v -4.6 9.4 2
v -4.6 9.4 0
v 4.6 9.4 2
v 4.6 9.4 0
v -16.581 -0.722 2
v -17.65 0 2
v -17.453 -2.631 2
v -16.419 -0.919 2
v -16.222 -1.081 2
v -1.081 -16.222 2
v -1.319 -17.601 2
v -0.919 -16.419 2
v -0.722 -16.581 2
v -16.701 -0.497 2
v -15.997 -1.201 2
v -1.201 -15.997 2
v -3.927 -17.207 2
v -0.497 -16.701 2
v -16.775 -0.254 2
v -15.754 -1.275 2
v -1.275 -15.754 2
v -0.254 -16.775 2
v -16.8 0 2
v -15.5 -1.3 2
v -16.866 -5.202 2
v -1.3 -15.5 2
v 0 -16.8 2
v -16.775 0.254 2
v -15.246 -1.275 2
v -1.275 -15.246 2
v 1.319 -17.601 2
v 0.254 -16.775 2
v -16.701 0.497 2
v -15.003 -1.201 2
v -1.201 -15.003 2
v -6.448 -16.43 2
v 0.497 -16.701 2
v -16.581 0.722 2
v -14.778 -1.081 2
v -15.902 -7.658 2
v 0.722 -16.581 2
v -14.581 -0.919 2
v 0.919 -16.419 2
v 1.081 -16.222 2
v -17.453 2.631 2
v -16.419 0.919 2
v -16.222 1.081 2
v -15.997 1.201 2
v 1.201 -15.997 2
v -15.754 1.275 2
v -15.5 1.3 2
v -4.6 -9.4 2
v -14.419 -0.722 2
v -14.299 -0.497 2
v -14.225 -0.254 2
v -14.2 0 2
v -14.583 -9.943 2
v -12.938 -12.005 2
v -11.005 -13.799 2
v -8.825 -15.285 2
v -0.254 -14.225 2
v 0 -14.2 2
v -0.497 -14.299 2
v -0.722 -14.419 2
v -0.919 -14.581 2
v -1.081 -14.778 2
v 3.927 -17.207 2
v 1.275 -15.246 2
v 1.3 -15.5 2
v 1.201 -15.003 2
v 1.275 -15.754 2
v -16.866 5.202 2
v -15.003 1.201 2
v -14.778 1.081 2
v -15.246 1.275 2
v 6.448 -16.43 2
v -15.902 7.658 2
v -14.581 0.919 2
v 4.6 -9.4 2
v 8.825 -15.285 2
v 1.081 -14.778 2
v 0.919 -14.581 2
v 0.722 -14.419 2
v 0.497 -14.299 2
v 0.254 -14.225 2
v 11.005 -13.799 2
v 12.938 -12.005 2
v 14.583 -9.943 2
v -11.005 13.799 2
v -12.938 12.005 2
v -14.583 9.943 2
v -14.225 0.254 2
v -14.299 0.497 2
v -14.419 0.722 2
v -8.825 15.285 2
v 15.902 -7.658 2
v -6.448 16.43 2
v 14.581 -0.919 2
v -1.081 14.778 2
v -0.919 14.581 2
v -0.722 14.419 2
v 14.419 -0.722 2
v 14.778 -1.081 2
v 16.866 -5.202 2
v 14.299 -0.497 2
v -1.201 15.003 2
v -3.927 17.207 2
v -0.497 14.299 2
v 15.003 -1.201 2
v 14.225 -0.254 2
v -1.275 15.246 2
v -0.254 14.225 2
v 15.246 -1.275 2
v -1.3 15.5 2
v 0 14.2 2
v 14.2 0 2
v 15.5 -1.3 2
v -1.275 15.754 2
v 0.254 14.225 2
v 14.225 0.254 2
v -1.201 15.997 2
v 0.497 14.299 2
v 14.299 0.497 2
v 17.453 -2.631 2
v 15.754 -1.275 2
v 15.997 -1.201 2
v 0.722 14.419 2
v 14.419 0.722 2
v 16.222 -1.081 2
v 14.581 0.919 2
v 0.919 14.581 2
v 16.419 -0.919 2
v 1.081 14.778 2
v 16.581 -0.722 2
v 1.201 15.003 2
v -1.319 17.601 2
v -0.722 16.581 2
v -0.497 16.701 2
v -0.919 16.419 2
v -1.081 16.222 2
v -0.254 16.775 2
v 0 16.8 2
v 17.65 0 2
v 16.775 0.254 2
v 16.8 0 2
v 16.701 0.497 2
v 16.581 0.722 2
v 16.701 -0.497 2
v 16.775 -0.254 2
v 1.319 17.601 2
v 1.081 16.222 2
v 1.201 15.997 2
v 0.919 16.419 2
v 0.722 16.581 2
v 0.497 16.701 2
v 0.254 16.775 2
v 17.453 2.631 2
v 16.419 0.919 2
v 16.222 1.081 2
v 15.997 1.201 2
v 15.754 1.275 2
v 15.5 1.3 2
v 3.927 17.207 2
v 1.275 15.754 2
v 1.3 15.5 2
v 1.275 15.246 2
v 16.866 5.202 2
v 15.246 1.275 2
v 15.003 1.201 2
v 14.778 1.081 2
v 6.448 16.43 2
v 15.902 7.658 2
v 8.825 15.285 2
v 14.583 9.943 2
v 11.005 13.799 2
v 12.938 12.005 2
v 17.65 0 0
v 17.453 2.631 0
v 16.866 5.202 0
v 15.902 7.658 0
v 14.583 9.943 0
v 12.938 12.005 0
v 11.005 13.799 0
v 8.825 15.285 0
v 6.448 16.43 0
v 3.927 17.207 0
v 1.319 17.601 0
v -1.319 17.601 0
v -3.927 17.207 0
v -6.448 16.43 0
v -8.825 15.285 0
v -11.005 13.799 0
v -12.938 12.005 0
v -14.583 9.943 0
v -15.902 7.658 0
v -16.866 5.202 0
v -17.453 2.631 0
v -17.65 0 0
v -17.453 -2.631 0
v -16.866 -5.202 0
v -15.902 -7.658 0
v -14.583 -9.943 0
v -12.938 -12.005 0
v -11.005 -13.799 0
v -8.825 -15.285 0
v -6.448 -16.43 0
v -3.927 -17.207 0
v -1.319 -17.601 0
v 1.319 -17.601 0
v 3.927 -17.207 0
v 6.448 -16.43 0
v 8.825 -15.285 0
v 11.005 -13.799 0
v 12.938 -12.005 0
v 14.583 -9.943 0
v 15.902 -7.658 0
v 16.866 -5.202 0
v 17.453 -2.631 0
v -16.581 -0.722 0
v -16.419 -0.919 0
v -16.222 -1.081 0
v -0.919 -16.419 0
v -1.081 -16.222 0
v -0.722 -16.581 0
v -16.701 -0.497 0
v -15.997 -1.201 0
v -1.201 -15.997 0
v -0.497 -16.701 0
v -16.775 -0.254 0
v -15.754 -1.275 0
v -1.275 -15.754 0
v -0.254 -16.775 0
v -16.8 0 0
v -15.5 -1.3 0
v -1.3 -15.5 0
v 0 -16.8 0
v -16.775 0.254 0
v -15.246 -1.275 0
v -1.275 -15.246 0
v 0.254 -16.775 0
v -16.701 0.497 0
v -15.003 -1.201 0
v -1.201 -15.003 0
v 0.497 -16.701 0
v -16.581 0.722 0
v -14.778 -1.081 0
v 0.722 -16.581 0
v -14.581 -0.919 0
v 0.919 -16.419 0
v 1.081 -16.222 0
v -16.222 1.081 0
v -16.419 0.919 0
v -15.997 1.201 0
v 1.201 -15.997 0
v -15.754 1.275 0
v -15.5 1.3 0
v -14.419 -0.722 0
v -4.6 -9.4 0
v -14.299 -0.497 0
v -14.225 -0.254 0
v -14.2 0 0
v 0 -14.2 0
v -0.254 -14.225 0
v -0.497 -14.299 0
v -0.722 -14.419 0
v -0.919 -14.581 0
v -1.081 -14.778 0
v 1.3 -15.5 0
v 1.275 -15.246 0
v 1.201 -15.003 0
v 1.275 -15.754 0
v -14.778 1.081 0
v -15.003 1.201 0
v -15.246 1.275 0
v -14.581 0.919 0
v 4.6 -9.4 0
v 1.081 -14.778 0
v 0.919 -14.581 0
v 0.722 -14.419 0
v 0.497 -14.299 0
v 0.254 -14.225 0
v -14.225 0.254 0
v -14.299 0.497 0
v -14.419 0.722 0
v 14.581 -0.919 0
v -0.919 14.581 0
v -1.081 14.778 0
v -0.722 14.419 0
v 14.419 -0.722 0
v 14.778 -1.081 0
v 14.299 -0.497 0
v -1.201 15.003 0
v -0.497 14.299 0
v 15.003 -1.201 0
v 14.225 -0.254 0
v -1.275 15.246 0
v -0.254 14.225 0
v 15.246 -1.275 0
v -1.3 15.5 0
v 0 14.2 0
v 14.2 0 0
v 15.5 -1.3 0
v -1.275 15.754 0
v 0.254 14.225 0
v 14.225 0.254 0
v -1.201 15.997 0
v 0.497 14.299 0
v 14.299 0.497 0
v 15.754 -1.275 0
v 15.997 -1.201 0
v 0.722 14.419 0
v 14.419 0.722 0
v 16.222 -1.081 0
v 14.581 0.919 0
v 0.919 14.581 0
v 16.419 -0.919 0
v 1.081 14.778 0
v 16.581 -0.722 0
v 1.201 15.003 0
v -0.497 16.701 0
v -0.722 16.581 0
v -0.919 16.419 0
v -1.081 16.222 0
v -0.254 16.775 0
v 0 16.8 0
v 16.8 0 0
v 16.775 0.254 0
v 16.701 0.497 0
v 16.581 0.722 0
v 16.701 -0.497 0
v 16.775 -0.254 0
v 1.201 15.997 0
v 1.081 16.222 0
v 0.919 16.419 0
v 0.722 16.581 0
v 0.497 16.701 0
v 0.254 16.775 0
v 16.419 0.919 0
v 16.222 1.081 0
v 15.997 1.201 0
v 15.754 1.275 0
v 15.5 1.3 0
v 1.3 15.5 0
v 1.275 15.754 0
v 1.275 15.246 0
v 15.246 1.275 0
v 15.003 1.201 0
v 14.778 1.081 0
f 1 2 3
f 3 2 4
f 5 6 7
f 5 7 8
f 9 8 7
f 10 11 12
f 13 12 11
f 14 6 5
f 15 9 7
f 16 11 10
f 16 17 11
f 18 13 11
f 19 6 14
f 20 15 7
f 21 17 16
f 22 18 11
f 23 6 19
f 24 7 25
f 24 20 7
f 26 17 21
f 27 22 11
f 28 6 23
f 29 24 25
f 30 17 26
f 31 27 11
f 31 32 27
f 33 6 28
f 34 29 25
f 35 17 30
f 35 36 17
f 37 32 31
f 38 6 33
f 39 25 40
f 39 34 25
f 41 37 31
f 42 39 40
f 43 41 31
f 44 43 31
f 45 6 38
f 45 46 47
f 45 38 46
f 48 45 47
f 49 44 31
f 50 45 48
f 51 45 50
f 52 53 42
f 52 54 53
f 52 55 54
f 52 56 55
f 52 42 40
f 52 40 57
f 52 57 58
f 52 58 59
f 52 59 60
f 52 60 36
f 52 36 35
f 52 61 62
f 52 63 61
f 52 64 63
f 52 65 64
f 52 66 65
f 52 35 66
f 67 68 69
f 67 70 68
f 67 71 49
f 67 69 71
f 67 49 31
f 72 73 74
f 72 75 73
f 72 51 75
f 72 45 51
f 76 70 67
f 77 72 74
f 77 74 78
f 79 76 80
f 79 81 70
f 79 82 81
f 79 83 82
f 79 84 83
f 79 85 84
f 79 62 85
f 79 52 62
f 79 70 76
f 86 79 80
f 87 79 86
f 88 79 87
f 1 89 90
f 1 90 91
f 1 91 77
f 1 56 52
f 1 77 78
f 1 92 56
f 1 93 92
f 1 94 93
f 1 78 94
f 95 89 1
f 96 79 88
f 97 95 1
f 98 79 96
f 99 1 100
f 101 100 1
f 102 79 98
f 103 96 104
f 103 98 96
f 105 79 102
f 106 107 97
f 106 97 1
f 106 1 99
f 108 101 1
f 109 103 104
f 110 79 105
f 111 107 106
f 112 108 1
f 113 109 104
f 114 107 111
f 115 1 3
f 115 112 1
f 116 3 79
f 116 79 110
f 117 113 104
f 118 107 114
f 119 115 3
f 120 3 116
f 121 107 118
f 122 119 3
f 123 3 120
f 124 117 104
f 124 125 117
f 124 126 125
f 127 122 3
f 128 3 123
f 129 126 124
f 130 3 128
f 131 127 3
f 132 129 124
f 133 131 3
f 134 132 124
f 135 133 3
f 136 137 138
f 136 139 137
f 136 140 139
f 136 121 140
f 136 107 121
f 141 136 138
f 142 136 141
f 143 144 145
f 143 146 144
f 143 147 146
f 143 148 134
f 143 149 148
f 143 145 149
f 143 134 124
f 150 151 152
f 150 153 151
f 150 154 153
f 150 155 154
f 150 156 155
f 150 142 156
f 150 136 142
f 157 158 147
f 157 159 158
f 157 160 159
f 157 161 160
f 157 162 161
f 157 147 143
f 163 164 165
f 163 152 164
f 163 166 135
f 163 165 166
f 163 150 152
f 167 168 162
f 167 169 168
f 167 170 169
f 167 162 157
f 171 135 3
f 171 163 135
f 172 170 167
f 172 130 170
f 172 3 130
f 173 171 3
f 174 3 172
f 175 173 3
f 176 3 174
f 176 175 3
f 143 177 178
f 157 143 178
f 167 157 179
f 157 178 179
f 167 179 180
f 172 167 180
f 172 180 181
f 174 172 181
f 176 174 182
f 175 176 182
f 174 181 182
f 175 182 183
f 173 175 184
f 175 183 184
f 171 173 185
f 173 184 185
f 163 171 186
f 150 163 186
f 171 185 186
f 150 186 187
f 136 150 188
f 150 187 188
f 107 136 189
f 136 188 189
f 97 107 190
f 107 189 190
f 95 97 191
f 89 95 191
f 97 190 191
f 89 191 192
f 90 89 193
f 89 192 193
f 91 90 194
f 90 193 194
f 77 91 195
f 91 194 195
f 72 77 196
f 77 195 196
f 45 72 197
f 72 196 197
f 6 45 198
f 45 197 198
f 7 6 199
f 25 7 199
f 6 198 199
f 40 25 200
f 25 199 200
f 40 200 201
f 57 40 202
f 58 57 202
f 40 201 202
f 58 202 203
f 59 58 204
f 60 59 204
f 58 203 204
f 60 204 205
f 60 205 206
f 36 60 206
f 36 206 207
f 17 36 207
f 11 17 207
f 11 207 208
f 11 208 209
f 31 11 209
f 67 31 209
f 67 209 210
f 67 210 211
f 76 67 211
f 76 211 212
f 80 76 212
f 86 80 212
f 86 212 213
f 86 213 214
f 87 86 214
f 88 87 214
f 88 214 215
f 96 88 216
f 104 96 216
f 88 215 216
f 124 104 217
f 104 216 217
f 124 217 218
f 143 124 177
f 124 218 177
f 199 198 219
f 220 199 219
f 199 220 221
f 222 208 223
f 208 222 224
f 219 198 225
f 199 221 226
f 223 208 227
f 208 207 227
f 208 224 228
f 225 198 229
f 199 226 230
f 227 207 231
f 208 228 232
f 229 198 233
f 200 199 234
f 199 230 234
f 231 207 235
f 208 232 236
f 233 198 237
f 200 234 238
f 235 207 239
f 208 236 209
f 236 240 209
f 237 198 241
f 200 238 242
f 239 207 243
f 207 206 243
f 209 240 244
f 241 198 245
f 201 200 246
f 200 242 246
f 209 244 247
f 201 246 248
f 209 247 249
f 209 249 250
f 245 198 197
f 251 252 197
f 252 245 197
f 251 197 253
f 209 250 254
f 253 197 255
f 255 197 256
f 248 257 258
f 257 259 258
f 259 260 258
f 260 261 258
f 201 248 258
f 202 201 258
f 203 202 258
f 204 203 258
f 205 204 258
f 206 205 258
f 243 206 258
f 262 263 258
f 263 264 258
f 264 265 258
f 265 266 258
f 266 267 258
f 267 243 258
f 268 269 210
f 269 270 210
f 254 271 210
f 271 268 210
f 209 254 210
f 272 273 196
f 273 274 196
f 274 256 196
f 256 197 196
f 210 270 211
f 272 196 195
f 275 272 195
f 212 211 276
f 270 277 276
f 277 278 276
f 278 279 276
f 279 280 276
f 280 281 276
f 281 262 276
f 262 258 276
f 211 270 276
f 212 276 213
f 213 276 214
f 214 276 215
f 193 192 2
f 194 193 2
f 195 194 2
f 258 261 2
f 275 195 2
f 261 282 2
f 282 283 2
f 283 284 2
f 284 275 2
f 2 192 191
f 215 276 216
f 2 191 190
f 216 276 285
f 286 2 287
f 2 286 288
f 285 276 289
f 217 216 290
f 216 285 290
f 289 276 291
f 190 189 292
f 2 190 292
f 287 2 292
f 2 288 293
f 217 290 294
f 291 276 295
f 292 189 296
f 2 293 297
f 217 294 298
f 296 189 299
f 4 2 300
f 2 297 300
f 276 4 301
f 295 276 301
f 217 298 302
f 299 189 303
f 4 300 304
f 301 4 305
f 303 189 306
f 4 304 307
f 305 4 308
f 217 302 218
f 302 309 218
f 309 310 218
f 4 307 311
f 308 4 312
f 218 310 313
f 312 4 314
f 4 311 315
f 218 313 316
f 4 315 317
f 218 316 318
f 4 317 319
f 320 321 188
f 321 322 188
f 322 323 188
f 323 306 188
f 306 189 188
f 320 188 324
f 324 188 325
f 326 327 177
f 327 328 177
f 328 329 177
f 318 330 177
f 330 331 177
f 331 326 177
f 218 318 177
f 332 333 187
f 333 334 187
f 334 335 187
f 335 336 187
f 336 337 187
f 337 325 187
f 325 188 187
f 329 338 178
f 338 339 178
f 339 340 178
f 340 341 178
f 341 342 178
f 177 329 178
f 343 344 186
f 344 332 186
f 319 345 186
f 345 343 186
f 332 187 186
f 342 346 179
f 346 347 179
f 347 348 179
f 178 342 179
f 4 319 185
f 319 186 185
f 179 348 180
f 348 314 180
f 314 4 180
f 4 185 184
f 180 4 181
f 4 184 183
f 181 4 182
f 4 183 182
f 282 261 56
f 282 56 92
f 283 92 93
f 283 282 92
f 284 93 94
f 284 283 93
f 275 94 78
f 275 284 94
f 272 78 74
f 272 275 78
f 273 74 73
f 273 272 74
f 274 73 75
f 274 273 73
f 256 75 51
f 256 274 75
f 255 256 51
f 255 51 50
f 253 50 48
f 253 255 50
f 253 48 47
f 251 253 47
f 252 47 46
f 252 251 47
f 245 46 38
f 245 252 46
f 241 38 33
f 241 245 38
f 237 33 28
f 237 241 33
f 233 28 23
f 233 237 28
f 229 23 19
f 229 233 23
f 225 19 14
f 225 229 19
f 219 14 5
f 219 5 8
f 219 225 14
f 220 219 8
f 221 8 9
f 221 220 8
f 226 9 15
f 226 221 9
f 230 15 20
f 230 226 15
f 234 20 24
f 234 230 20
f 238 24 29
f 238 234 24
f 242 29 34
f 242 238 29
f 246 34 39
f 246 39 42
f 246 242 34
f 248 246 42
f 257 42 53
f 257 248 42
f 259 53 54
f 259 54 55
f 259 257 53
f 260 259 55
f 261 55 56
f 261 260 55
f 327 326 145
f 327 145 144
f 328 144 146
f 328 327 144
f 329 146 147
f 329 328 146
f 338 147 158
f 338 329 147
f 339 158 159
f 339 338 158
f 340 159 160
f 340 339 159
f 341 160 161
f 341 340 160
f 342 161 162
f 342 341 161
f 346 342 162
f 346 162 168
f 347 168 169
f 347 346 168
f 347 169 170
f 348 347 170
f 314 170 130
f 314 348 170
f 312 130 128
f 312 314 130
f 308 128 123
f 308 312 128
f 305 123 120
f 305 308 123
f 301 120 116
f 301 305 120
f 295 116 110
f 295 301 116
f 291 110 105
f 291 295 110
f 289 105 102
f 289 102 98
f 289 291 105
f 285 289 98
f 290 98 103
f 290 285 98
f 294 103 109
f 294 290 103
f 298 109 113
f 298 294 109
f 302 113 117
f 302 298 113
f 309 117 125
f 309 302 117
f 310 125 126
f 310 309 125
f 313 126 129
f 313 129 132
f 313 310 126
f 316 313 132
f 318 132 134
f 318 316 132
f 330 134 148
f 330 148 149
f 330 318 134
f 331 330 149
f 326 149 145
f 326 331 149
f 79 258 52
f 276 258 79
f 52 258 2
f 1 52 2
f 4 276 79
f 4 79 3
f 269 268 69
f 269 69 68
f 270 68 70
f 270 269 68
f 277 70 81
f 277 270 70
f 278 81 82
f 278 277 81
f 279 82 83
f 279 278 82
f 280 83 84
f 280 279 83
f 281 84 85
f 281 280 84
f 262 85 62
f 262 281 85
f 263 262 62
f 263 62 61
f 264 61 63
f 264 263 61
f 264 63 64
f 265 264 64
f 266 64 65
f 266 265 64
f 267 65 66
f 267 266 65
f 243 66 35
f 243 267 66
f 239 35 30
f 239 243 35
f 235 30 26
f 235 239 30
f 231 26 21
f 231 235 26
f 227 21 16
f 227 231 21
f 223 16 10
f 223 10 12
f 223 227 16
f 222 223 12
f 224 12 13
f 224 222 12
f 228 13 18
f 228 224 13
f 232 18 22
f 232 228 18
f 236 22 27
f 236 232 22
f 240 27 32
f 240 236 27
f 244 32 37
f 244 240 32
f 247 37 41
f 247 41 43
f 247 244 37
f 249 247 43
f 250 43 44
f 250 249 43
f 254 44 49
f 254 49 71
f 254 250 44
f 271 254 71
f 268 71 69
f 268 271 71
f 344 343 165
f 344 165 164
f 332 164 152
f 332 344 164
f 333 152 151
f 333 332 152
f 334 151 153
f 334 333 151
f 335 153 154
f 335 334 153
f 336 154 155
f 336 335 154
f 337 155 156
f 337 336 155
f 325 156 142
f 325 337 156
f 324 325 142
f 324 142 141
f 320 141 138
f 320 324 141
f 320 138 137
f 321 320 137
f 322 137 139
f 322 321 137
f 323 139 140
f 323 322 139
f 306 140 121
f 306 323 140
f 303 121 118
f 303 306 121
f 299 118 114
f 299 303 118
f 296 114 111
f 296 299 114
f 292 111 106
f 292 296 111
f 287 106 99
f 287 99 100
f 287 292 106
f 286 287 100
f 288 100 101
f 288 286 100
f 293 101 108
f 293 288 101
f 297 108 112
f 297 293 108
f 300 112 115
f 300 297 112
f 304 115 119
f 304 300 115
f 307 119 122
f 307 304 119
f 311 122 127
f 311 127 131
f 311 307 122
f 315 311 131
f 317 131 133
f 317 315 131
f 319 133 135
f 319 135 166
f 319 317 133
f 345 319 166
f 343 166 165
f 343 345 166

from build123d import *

# Parameters (mm, degrees)
F0_R     = 17.65
F0_R_2   = 1.3
F0_W     = 9.2
F0_H     = 18.8
F1_DEPTH = 2


with BuildPart() as f1:
    # F0 (on Top) → F1 (new body)
    with BuildSketch(Plane.XY):
        Circle(F0_R)
        with Locations((0, -15.5)):
            Circle(F0_R_2, mode=Mode.SUBTRACT)
        with Locations((-15.5, 0)):
            Circle(F0_R_2, mode=Mode.SUBTRACT)
        Rectangle(F0_W, F0_H, mode=Mode.SUBTRACT)
        with Locations((15.5, 0)):
            Circle(F0_R_2, mode=Mode.SUBTRACT)
        with Locations((0, 15.5)):
            Circle(F0_R_2, mode=Mode.SUBTRACT)
    extrude(amount=F1_DEPTH)


solid = f1.part
